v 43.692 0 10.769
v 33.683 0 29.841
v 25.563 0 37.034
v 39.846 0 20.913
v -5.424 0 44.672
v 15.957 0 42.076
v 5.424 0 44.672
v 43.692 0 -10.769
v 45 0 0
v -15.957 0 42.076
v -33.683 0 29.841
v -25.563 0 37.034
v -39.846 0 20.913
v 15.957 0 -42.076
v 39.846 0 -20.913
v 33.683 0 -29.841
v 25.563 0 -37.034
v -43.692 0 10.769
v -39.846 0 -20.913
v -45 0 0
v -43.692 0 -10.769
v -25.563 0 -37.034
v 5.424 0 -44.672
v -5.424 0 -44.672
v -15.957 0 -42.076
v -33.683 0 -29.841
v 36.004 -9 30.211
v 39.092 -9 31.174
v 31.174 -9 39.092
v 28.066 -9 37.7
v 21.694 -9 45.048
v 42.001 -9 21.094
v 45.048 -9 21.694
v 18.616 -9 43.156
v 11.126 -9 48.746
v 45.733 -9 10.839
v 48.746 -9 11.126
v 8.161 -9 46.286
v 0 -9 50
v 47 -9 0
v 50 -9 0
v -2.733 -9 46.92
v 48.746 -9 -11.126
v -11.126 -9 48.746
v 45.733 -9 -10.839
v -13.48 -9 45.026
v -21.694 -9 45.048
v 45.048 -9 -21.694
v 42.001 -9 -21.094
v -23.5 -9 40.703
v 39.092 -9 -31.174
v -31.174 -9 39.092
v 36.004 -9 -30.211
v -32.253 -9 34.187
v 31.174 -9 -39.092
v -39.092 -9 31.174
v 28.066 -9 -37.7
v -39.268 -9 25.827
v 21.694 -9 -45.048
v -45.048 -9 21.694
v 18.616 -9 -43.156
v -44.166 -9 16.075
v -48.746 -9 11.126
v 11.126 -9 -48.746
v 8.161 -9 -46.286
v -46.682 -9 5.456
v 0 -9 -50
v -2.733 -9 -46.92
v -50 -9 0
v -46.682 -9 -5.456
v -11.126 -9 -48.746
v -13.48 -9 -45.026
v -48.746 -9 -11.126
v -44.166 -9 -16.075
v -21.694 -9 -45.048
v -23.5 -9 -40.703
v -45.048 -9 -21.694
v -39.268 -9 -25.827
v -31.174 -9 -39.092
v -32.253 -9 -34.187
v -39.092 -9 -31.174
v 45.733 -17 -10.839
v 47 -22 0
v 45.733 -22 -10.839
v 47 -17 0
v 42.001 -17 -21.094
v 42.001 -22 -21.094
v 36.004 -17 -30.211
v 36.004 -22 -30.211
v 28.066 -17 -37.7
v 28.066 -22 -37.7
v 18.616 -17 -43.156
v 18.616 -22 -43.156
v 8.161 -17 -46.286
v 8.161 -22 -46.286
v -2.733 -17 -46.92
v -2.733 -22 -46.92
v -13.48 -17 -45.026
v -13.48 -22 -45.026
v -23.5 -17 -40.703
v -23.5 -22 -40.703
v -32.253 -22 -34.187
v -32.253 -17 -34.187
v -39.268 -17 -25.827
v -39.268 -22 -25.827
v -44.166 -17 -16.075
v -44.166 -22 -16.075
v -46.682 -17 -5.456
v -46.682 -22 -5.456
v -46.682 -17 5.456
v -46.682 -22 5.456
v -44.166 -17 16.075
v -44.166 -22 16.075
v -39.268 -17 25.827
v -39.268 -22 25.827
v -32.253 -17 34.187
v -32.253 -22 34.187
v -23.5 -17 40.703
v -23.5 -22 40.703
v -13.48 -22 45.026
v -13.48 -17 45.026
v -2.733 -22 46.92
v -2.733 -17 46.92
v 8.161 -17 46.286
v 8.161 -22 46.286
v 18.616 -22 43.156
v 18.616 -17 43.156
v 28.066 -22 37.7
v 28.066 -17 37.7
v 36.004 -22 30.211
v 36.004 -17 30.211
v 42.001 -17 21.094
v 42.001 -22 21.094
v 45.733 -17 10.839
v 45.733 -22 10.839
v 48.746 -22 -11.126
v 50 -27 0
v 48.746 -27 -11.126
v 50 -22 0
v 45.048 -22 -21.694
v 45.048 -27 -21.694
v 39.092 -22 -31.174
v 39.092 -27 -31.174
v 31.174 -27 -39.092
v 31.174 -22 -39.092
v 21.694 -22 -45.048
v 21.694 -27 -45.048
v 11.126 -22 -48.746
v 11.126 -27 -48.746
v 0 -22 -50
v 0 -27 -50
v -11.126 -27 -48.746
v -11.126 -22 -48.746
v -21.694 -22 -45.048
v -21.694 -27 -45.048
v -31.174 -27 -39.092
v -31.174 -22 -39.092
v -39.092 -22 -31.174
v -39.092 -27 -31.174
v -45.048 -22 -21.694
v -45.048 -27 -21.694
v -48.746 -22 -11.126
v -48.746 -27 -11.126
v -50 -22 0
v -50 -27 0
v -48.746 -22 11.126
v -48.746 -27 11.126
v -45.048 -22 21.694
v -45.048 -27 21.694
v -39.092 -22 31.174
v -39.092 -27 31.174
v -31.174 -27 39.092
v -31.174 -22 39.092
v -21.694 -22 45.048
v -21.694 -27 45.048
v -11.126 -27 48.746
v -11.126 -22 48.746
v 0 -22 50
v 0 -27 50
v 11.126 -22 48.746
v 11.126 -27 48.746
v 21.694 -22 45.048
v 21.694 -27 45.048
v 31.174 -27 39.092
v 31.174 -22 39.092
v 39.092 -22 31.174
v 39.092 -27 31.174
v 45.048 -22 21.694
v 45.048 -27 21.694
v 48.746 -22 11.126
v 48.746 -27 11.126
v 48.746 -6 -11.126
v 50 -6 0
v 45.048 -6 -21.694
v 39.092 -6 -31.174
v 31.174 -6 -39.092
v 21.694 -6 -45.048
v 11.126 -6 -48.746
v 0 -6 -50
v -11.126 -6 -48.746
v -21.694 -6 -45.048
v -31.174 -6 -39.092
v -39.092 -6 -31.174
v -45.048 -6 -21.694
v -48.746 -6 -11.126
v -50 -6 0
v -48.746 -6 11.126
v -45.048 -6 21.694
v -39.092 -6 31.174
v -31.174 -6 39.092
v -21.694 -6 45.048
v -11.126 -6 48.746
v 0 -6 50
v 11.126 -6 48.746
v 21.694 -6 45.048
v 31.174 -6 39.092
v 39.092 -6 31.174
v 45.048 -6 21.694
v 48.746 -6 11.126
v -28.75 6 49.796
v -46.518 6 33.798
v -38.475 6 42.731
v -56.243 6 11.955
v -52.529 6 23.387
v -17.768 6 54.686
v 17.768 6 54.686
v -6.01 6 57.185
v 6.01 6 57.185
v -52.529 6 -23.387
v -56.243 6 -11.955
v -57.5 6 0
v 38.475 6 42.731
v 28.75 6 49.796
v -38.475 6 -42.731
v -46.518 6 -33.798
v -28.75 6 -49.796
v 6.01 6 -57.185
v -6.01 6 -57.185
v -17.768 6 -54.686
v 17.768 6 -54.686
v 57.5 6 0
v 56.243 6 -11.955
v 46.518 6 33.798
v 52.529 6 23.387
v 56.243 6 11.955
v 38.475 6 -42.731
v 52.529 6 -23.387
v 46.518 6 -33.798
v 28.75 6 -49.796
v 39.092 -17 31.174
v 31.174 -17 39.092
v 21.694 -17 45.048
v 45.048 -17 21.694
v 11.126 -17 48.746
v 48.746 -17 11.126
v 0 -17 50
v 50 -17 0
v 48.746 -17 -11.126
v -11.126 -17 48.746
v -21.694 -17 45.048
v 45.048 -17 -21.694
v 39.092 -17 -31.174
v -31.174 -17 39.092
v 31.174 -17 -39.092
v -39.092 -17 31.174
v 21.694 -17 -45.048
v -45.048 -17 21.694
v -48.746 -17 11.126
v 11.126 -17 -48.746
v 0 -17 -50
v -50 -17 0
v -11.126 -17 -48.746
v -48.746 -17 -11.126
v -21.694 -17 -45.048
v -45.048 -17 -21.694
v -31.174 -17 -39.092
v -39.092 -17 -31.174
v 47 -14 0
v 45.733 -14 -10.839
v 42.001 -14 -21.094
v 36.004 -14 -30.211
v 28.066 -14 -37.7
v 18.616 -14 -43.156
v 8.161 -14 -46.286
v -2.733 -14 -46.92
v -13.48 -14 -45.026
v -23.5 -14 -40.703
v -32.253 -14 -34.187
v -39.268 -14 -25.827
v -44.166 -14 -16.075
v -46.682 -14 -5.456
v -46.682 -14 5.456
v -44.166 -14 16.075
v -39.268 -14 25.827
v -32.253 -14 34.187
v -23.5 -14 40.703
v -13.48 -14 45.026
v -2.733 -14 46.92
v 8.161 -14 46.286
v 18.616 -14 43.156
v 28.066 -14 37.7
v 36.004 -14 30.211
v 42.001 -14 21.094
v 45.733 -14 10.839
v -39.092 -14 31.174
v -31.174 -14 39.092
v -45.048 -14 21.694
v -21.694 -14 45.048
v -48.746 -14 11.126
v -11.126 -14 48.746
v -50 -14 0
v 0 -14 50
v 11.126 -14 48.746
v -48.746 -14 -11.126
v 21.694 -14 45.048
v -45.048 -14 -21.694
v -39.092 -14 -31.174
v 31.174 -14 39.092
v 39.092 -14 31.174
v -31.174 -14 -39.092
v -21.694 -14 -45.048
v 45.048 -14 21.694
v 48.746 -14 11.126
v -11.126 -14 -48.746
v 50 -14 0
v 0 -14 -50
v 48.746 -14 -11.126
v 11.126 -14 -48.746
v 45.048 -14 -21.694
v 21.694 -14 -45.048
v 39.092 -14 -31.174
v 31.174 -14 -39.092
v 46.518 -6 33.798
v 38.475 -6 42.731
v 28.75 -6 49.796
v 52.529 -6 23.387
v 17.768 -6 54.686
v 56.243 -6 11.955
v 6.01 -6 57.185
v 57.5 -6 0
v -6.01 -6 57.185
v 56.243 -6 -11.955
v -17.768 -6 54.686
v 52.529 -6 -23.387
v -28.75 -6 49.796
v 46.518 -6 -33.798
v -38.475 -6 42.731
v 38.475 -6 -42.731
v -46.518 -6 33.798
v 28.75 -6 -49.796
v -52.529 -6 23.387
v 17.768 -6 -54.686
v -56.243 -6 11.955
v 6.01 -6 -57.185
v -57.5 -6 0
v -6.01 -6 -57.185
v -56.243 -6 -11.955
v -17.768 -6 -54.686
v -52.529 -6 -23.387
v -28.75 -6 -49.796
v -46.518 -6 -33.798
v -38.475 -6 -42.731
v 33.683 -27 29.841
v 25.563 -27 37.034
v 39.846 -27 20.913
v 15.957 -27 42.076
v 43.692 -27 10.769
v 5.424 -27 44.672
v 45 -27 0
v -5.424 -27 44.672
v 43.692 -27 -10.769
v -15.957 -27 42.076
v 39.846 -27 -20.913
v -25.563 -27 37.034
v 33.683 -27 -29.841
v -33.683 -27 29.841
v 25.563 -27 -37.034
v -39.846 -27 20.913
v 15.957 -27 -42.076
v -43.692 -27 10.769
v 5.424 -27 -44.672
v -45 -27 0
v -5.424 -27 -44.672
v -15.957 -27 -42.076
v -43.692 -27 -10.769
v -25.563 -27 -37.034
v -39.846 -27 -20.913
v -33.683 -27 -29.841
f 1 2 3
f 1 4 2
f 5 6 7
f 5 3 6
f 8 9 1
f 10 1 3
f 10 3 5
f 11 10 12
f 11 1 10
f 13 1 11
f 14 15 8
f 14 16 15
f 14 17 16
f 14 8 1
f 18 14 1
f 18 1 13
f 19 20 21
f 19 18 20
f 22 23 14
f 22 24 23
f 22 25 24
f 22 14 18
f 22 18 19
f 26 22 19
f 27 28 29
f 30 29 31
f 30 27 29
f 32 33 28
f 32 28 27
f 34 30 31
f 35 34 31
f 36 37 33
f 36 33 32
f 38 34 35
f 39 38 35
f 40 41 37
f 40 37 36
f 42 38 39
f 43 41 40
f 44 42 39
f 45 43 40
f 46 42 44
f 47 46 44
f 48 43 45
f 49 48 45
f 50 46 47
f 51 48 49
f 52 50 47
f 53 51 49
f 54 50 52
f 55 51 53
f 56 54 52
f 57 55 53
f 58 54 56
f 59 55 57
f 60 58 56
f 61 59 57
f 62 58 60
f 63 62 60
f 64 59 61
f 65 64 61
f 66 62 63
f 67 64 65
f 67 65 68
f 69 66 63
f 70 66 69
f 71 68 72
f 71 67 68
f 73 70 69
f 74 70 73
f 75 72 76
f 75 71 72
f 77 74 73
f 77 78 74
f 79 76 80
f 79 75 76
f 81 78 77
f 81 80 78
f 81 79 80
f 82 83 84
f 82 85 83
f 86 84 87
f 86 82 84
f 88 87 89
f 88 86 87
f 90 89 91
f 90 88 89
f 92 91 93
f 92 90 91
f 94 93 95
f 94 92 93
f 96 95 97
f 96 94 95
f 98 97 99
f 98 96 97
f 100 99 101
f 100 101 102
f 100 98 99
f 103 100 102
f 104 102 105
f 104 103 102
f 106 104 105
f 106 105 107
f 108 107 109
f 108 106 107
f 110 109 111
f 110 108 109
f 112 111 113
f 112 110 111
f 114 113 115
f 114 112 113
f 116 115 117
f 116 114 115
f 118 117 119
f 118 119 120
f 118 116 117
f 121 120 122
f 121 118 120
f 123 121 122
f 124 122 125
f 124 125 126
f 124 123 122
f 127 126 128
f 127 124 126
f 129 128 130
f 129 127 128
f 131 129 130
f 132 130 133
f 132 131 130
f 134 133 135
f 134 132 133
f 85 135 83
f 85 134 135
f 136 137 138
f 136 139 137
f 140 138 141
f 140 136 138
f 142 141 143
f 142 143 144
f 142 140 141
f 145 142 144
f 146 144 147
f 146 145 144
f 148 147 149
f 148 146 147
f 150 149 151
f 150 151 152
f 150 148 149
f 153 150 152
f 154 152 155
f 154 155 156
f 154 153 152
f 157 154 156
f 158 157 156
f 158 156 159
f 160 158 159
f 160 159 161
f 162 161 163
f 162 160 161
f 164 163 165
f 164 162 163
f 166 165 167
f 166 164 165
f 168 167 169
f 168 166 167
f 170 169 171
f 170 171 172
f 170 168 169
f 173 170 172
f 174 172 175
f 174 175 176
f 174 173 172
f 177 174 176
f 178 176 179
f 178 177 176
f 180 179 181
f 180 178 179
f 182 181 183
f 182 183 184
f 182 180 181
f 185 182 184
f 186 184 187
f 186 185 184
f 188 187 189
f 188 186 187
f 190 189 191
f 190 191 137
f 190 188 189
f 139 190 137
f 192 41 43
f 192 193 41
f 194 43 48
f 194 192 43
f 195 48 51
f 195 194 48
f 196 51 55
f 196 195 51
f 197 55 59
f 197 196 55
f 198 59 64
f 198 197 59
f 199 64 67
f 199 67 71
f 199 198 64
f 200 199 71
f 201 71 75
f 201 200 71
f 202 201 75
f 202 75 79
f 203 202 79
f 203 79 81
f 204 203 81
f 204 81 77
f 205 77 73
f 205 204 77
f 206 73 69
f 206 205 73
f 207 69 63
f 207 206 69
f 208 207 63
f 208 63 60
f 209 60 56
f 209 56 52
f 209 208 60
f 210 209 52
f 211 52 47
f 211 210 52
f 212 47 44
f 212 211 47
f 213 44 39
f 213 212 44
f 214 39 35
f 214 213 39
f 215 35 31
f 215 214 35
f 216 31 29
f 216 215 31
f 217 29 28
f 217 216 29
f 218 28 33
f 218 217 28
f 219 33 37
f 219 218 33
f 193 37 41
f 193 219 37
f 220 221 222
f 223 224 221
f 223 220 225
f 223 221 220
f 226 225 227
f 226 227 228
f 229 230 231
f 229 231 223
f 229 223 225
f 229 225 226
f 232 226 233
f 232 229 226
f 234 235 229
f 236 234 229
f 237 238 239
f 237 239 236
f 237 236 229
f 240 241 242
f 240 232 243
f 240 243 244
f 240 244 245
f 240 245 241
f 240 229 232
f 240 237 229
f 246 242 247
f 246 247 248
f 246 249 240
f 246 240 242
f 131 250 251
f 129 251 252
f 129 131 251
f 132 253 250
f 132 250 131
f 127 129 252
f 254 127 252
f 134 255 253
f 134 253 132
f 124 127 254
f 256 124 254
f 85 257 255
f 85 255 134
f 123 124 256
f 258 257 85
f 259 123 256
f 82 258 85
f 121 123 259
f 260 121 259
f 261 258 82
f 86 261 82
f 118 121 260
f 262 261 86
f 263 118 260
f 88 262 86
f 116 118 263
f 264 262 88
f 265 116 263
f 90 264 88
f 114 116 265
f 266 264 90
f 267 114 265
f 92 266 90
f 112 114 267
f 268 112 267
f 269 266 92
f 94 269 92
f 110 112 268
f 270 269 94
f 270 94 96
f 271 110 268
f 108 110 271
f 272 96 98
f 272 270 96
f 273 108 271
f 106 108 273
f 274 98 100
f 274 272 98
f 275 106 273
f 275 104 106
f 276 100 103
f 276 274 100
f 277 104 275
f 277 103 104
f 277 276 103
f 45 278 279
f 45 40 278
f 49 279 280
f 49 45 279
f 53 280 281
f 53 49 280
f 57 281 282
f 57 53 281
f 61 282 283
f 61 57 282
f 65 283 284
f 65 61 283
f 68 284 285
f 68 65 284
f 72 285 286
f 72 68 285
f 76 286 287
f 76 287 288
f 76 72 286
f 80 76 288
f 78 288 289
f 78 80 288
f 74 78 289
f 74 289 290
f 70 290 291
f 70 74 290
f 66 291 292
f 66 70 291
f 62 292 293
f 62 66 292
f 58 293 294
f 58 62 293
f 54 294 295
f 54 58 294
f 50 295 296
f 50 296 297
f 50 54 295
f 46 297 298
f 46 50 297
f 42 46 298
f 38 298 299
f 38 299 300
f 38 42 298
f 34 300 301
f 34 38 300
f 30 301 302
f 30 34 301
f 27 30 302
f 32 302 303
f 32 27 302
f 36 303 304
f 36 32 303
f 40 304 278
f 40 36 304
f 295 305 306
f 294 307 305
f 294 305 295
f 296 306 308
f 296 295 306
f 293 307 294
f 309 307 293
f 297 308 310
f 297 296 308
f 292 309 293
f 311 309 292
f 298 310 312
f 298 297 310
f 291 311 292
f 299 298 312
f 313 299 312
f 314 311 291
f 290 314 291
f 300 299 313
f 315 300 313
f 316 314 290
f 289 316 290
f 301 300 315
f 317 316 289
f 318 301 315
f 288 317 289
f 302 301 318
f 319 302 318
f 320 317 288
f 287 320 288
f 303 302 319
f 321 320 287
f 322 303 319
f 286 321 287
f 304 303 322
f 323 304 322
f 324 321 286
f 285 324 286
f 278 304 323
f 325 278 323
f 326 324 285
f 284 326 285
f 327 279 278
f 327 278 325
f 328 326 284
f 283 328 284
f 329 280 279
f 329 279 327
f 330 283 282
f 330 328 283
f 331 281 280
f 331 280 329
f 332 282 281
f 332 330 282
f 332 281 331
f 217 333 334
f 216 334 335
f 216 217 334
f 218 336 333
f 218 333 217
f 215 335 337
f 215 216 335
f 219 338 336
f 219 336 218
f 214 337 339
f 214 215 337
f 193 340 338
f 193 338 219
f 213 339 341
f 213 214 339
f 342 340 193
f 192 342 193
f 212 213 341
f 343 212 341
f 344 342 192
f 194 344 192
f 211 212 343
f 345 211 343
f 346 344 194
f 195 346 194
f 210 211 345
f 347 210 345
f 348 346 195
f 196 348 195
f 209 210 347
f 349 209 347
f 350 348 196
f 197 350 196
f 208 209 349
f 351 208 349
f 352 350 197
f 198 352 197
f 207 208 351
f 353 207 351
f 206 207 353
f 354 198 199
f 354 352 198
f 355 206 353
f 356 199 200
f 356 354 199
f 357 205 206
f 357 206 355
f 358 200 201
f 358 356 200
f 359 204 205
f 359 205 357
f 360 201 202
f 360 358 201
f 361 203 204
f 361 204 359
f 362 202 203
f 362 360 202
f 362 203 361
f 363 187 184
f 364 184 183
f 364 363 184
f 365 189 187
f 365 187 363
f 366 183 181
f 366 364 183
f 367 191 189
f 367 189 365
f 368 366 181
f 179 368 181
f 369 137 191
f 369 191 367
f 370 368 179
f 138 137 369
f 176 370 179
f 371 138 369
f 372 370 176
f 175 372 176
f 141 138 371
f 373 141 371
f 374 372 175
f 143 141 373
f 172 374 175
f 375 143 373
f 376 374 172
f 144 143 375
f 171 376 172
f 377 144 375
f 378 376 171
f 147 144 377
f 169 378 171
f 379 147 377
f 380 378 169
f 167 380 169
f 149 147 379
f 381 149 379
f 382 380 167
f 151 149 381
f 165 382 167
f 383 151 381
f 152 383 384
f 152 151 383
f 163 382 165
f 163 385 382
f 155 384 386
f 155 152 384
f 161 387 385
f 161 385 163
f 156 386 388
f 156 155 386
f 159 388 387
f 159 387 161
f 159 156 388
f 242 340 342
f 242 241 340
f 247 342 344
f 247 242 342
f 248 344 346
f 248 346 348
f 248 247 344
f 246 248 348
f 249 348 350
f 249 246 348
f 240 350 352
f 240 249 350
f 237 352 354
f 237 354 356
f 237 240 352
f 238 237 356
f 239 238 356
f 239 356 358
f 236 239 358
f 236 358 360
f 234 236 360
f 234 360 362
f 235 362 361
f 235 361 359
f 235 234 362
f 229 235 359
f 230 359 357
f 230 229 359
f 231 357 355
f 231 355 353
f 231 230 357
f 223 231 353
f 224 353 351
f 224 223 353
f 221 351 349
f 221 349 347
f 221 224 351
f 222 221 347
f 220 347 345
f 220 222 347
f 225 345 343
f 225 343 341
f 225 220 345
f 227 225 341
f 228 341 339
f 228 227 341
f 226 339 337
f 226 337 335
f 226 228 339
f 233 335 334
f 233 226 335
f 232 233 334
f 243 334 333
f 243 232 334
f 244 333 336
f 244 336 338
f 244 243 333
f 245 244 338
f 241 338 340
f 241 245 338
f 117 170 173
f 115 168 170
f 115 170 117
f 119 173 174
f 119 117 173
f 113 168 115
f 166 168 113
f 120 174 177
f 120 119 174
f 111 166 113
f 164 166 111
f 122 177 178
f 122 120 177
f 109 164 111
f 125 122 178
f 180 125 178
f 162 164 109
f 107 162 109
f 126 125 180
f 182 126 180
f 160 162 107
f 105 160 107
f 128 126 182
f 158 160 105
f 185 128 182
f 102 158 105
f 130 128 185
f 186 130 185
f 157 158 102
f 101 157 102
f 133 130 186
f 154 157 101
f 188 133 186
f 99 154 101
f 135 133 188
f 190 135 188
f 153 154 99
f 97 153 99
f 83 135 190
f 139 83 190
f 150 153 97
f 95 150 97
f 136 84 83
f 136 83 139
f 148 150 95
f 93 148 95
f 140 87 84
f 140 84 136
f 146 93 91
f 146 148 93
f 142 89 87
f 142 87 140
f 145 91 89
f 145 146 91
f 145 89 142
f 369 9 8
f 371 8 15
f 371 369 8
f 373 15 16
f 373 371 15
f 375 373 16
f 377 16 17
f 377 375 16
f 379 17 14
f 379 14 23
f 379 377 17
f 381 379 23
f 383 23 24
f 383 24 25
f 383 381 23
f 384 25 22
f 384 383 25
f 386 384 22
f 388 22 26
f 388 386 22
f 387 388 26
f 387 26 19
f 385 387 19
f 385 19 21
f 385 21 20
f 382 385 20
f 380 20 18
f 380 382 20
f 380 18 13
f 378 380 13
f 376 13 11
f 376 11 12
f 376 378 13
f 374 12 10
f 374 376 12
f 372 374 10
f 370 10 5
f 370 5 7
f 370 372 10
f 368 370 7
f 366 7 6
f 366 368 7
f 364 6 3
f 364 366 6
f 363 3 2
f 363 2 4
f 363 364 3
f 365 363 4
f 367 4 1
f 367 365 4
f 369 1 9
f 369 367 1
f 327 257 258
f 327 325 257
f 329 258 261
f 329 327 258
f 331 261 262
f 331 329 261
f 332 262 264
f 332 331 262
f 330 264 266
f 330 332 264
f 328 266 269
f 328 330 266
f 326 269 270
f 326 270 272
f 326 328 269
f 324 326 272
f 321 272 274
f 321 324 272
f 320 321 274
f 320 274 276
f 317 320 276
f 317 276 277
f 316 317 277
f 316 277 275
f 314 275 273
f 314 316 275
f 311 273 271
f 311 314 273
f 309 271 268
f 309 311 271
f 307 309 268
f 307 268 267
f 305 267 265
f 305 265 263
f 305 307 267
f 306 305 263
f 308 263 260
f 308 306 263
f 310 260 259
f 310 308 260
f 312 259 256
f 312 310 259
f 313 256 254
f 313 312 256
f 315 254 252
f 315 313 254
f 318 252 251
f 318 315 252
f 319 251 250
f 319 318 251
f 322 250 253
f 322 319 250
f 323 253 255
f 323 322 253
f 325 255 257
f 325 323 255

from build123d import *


with BuildPart() as part:
    # Esquisse1 → Révolution1 (revolve)
    with BuildSketch(Plane.XY):
        Polygon((0, 0), (45, 0), (45, -27), (50, -27), (50, -22), (47, -22), (47, -17), (50, -17), (50, -14), (47, -14), (47, -9), (50, -9), (50, -6), (57.5, -6), (57.5, 6), (0, 6), align=None)
    revolve(axis=Axis((0, 0, 0), (0, 1, 0)))


solid = part.part
